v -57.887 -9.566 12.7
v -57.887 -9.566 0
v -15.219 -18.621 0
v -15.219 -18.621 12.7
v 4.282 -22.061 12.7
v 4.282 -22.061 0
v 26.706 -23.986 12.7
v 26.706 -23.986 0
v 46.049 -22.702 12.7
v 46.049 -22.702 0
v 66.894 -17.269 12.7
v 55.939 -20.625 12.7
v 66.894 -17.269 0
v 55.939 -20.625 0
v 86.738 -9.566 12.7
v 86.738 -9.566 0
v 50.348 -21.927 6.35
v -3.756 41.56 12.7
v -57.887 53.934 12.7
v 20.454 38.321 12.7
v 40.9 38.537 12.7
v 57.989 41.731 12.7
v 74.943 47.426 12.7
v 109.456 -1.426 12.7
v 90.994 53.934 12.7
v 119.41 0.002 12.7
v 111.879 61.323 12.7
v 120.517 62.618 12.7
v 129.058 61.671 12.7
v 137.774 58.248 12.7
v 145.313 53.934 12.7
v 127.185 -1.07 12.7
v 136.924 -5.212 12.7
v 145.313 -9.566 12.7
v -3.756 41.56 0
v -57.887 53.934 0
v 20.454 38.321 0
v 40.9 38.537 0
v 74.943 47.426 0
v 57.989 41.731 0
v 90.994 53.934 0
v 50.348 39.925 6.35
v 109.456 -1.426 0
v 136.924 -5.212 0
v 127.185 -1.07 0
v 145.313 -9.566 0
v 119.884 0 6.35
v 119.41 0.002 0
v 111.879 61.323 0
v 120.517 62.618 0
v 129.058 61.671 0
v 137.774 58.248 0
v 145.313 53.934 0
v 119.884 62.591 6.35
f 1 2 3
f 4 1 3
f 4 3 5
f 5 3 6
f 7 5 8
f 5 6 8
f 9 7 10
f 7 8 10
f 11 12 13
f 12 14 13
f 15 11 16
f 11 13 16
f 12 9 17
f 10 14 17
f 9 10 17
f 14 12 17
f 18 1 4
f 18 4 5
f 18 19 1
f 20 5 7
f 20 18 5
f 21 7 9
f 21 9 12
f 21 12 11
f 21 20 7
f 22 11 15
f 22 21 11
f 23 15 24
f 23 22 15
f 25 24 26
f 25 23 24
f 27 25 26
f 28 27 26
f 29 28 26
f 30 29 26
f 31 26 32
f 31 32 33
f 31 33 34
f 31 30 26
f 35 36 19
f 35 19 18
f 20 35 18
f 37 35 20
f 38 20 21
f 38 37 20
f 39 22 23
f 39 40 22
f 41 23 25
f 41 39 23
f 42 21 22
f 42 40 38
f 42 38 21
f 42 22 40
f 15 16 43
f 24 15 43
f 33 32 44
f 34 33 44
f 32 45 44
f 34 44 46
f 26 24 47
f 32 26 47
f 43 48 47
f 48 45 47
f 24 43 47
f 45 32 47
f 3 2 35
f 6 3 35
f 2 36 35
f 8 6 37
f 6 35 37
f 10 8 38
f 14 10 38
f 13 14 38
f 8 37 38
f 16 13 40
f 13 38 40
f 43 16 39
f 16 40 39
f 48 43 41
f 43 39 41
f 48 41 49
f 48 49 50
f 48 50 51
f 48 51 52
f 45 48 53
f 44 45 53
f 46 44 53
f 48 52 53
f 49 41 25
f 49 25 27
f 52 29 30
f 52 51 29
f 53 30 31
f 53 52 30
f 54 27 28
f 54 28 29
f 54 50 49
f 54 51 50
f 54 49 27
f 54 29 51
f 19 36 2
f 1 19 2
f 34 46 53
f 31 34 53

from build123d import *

# Parameters (mm, degrees)
F1_DEPTH = 12.7


with BuildPart() as f1:
    # F0 (on Top) → F1 (new body)
    with BuildSketch(Plane.XY):
        with BuildLine():
            Line((86.7375563659, -9.5659682199), (-57.8874200583, -9.5659682199))
            add(Edge.make_bspline(
                [(-57.8874200583, -9.5659682199), (-15.5372899026, -18.0853269994), (31.1257096461, -32.5612871735), (75.3183046829, -14.2258941015), (86.7375563659, -9.5659682199)],
                knots=[0, 0, 0, 0, 0.4315025265, 0.5995713788, 0.5995713788, 0.5995713788, 0.5995713788], degree=3))
        make_face()
        with BuildLine():
            add(Edge.make_bspline(
                [(-57.8874200583, 53.9340317801), (-15.5372899026, 44.1508069634), (32.8896853146, 28.926877693), (78.4214537847, 48.7759008936), (90.9942217823, 53.9340317801)],
                knots=[0, 0, 0, 0, 0.4320173994, 0.621889754, 0.621889754, 0.621889754, 0.621889754], degree=3))
            Line((-57.8874200583, 53.9340317801), (-57.8874200583, -9.5659682199))
            Line((-57.8874200583, -9.5659682199), (86.7375563659, -9.5659682199))
            add(Edge.make_bspline(
                [(86.7375563659, -9.5659682199), (99.3031424411, -4.4382504505), (123.9704535558, 5.4063635599), (138.3019810991, -6.5732044802), (145.3125799417, -9.5659682199)],
                knots=[0.5995713788, 0.5995713788, 0.5995713788, 0.5995713788, 0.7845120114, 1, 1, 1, 1], degree=3))
            Line((145.3125799417, -9.5659682199), (145.3125799417, 53.9340317801))
            Line((145.3125799417, 53.9340317801), (90.9942217823, 53.9340317801))
        make_face()
        with BuildLine():
            add(Edge.make_bspline(
                [(90.9942217823, 53.9340317801), (101.8393417617, 58.3833740684), (124.5941526904, 67.1056911477), (138.4573890247, 57.9812418233), (145.3125799417, 53.9340317801)],
                knots=[0.621889754, 0.621889754, 0.621889754, 0.621889754, 0.7856713864, 1, 1, 1, 1], degree=3))
            Line((90.9942217823, 53.9340317801), (145.3125799417, 53.9340317801))
        make_face()
    extrude(amount=F1_DEPTH)


solid = f1.part
